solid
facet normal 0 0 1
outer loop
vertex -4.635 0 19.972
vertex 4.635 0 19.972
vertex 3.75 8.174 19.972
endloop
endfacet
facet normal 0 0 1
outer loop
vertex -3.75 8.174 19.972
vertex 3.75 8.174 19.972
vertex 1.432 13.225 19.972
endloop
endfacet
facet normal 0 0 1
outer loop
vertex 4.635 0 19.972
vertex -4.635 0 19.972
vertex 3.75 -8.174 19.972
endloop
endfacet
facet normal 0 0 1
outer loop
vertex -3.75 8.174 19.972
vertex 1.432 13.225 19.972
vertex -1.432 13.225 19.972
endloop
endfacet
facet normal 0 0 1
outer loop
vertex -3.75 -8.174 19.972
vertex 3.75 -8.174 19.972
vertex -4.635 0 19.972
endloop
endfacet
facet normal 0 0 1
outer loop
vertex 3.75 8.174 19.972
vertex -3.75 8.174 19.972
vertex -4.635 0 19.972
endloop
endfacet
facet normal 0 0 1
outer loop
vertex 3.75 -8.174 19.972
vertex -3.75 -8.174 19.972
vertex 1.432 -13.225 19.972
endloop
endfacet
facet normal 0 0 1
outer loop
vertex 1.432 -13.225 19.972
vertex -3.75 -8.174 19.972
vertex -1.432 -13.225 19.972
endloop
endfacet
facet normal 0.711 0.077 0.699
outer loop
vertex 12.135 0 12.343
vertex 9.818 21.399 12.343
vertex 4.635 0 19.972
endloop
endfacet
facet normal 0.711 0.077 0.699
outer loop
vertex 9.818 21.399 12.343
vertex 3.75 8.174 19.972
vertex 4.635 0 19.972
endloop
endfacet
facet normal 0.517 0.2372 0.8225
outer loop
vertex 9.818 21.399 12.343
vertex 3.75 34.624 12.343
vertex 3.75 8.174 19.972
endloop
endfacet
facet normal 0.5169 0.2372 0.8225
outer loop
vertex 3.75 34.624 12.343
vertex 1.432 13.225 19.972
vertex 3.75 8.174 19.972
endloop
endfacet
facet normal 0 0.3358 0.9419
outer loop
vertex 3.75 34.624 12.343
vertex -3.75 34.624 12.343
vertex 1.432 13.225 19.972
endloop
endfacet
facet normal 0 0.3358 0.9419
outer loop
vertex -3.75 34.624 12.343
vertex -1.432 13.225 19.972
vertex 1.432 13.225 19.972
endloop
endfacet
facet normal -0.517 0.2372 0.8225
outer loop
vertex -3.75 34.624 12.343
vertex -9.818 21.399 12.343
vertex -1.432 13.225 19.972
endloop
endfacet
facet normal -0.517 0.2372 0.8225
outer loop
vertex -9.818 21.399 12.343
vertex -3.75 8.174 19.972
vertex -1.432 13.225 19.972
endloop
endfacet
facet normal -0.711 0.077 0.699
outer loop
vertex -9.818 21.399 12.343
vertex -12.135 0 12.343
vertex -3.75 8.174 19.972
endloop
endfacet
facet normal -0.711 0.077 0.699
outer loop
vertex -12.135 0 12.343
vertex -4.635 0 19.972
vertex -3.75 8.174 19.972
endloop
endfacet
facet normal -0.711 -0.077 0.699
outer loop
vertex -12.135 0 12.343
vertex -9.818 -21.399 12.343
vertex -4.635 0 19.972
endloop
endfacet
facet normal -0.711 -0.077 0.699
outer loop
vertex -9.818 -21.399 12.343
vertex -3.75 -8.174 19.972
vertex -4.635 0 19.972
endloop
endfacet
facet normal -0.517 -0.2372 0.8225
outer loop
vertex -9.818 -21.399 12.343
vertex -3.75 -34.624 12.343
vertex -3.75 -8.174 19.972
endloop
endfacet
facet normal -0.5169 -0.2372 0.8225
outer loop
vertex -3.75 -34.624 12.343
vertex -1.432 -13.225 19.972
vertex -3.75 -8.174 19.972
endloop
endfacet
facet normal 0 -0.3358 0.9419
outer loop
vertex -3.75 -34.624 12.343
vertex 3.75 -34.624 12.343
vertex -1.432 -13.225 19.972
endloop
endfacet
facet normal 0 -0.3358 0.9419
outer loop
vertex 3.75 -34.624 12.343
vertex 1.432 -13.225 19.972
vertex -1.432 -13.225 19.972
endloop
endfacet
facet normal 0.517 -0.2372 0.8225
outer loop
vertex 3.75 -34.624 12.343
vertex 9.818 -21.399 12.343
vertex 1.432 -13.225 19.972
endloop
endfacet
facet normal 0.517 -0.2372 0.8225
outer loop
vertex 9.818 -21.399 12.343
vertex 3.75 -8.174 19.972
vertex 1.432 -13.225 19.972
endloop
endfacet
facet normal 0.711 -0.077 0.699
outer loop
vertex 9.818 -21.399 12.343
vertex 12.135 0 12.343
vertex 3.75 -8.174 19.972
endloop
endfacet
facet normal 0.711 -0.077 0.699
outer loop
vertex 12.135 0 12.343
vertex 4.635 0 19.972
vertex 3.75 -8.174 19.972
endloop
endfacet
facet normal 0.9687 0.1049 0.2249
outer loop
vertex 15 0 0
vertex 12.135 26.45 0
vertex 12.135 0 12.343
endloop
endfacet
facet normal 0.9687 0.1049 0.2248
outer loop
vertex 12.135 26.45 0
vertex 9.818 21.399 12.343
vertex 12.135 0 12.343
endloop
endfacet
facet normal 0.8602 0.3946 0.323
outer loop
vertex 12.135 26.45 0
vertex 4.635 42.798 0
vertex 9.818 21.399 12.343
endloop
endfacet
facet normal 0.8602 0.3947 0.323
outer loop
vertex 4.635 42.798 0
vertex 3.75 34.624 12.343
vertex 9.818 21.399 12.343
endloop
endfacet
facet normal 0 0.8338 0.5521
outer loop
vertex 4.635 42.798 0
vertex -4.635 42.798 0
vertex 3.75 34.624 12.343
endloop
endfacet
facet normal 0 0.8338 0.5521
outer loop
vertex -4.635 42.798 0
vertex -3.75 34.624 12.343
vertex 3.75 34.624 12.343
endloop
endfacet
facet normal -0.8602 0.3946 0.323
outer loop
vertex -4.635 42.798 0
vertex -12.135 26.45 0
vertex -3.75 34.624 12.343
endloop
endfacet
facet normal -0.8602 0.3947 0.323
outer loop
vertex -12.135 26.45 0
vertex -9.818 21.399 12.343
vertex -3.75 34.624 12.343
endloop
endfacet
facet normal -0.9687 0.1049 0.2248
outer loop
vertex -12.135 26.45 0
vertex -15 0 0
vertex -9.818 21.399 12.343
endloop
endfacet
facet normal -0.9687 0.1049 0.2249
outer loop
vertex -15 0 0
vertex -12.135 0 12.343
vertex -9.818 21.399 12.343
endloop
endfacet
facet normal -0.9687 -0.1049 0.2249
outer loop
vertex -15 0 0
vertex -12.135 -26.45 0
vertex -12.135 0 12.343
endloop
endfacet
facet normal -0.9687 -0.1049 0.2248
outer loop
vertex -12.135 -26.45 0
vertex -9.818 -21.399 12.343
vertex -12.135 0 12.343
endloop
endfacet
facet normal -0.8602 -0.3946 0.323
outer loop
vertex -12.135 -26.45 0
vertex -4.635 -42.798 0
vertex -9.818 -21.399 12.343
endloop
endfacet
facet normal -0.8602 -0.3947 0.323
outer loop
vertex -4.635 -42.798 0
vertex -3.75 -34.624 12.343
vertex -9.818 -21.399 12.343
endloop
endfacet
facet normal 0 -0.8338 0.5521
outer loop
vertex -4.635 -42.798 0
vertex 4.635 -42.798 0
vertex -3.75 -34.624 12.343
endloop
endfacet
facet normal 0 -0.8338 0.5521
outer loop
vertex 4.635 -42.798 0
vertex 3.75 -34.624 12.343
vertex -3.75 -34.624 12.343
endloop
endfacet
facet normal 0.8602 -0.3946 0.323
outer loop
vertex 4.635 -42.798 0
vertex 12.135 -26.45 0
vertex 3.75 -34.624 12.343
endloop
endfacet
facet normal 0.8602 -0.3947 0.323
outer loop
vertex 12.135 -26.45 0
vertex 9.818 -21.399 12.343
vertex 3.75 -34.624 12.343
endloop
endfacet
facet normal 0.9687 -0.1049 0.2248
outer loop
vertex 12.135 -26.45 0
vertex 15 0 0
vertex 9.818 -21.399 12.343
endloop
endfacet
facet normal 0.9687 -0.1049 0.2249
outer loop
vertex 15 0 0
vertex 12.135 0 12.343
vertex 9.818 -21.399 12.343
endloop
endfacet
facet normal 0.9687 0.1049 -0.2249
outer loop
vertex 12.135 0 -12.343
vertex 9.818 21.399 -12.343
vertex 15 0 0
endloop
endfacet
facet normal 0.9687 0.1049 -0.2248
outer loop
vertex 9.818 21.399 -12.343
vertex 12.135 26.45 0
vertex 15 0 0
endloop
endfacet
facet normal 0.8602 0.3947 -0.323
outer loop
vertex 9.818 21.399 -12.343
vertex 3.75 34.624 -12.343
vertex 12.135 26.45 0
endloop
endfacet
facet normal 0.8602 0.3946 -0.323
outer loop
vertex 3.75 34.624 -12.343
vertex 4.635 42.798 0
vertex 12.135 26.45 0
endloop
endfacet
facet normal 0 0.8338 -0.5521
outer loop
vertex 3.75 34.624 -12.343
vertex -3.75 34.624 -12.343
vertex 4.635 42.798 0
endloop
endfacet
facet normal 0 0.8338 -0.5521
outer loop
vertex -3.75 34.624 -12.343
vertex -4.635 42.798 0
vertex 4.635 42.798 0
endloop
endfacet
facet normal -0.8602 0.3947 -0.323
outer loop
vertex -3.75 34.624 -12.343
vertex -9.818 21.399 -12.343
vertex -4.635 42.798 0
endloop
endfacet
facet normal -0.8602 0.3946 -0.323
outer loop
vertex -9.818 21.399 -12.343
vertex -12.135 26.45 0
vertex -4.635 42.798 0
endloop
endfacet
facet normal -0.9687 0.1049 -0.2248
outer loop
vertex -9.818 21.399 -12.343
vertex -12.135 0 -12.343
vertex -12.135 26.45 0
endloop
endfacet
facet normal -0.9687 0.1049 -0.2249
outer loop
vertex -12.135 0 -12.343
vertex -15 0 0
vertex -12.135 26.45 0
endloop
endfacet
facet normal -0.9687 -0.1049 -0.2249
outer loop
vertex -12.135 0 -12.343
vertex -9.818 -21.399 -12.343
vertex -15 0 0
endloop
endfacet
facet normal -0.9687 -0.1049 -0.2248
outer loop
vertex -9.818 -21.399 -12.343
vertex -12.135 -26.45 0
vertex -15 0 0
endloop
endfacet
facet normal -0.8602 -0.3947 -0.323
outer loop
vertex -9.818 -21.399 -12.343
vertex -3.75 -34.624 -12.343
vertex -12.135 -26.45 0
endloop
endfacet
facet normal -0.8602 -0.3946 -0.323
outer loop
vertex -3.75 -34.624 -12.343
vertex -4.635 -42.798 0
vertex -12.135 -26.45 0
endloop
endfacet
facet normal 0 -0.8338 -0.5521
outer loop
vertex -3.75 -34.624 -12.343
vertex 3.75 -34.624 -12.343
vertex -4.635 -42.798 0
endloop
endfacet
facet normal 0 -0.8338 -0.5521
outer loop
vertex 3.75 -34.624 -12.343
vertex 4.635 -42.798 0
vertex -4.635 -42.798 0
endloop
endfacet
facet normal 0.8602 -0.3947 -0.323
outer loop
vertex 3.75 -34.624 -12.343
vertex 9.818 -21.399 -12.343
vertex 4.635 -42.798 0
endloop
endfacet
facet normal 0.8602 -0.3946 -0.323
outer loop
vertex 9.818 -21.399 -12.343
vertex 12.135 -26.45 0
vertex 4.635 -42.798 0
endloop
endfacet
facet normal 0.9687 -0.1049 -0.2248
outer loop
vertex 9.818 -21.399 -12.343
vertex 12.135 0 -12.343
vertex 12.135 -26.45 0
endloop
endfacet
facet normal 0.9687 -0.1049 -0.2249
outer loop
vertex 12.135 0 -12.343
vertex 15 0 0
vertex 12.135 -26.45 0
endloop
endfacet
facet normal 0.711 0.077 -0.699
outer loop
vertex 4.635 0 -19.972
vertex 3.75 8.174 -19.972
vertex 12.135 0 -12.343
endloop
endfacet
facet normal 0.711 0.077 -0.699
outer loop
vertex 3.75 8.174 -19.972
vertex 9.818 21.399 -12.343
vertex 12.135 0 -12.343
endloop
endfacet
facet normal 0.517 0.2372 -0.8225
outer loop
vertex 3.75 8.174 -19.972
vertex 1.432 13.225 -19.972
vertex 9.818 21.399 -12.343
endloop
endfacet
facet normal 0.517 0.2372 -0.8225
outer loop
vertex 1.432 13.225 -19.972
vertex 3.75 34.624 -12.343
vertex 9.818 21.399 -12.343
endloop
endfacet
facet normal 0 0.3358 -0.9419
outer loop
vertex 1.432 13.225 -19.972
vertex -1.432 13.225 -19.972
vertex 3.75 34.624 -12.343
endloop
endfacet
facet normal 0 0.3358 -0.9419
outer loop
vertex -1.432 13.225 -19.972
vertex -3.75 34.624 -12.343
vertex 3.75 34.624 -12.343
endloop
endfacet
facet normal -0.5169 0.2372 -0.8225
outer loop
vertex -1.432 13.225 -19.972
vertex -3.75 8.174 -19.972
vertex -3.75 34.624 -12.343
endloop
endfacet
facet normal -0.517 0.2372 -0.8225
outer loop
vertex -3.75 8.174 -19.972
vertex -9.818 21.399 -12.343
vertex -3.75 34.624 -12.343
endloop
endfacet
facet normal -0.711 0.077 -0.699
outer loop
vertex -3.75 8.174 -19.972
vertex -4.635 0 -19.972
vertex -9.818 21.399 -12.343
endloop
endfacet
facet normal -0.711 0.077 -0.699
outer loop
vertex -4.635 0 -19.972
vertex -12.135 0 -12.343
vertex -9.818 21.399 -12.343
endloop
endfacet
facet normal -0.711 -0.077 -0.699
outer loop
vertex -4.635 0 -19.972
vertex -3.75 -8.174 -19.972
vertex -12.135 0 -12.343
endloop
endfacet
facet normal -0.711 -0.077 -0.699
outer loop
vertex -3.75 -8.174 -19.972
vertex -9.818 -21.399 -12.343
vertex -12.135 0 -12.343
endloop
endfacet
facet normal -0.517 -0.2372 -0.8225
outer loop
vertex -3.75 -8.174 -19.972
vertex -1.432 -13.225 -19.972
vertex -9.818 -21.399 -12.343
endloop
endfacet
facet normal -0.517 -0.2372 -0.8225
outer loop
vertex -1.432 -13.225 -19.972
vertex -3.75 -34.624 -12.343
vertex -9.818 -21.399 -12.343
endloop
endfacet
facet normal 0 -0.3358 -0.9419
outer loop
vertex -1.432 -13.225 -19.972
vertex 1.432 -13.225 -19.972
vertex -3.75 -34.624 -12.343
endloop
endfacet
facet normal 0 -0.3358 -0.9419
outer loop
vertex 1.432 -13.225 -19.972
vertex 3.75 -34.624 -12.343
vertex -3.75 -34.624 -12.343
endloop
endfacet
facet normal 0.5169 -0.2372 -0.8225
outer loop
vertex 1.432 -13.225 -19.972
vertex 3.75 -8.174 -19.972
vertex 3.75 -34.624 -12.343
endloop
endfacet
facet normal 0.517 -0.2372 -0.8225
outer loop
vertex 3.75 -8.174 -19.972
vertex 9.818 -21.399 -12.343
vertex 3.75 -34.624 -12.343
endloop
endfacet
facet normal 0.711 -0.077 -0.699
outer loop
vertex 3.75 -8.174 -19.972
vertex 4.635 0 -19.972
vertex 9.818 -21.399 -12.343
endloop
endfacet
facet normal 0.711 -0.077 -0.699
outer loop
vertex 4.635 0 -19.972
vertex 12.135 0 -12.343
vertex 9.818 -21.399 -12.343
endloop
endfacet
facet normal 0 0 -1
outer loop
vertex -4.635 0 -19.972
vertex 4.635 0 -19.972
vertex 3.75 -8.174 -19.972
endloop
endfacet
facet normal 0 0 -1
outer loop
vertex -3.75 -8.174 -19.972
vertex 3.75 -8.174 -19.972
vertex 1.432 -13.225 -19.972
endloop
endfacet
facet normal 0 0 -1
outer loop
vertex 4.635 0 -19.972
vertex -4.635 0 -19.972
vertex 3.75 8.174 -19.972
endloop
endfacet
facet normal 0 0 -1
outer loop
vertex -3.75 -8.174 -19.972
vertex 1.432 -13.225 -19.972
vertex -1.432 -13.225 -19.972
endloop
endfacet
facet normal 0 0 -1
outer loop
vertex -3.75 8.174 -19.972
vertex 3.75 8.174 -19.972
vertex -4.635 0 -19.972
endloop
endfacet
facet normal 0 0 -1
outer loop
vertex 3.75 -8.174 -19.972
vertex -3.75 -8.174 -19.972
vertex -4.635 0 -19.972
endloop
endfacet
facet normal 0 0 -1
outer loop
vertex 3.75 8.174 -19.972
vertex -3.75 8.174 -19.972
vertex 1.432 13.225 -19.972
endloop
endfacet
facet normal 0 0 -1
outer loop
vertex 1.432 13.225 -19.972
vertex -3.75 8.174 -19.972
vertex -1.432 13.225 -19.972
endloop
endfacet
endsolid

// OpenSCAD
// Generated by SolidPython 1.0.1 on 2020-07-29 00:46:46


scale(v = [5, 15, 7]) {
	sphere(r = 3);
}
/***********************************************
*********      SolidPython code:      **********
************************************************
 
# import packages: SolidPython
from solid import *
from solid.utils import *
from itertools import chain, combinations, permutations


class Resize:

    def __init__(self, scad_file):
        self.scad_file = scad_file
        #self.scad_file = import_scad(scad_file)
        # cone/cylinder param:
        self.r1 = 0
        self.r2 = 0
        self.h = 0
        # rectangular prism param:
        self.w = 0
        self.l = 0
        # ellipse param:
        self.r = 0

    # import OpenScad code (file name corresponds to shape)


    # classify shape + parameters
    def assign(self, param1, param2, param3):
        if self.scad_file == 'cone.scad':
            self.r1 = param1
            self.r2 = param2
            self.h = param3
        elif self.scad_file == 'cylinder.scad':
            self.r1 = param1
            self.r2 = param2
            self.h = param3
        elif self.scad_file == 'rectangularPrism.scad':
            self.h = param1
            self.l = param2
            self.w = param3
        else:
            self.r = param1
            self.h = param2

    # resize parameters
    def iterate(self):
        x = range(3, 20, 2)
        i = 1
        if self.scad_file == 'cone.scad':
            tempList = list(permutations(x, 2))
            for temp in tempList:
                param1 = temp[0]
                param2 = temp[1]
                filepath = 'produced_scad_files/' + 'cone' + str(param1) + '_' + str(param2) + '_' + '.scad'
                scad_render_to_file(cylinder(h=param1, r1=param2, r2=0), filepath)

        elif self.scad_file == 'cylinder.scad':
            tempList = list(permutations(x, 3))
            for temp in tempList:
                param1 = temp[0]
                param2 = temp[1]
                filepath = 'produced_scad_files/' + 'cylinder' + str(param1) + '_' + str(param2) + '_' + '.scad'
                scad_render_to_file(cylinder(h=param1, r1=param2, r2=param2), filepath)

        elif self.scad_file == 'rectangularPrism.scad':
            tempList = list(permutations(x, 3))
            for temp in tempList:
                param1 = temp[0]
                param2 = temp[1]
                param3 = temp[2]
                filepath = 'produced_scad_files/' + 'rectangularPrism' + str(param1) + '_' + str(param2) + '_' + str(
                    param3) + '.scad'
                scad_render_to_file(cube(size=(param1, param2, param3)), filepath)

        elif self.scad_file == 'ellipse.scad':
            tempList = list(permutations(x, 4))
            for temp in tempList:
                param1 = temp[0]
                param2 = temp[1]
                param3 = temp[2]
                param4 = temp[3]
                filepath = 'produced_scad_files/' + 'ellipse' + str(param1) + '_' + str(param2) + '_' + str(param3) + '_' + str(param4) + '.scad'
                scad_render_to_file(scale([param1, param2, param3])(sphere(r=param4)), filepath)

    def render_to_scadfile(self):
        scad_render_to_file(scad, 'example.scad') 
 
************************************************/
